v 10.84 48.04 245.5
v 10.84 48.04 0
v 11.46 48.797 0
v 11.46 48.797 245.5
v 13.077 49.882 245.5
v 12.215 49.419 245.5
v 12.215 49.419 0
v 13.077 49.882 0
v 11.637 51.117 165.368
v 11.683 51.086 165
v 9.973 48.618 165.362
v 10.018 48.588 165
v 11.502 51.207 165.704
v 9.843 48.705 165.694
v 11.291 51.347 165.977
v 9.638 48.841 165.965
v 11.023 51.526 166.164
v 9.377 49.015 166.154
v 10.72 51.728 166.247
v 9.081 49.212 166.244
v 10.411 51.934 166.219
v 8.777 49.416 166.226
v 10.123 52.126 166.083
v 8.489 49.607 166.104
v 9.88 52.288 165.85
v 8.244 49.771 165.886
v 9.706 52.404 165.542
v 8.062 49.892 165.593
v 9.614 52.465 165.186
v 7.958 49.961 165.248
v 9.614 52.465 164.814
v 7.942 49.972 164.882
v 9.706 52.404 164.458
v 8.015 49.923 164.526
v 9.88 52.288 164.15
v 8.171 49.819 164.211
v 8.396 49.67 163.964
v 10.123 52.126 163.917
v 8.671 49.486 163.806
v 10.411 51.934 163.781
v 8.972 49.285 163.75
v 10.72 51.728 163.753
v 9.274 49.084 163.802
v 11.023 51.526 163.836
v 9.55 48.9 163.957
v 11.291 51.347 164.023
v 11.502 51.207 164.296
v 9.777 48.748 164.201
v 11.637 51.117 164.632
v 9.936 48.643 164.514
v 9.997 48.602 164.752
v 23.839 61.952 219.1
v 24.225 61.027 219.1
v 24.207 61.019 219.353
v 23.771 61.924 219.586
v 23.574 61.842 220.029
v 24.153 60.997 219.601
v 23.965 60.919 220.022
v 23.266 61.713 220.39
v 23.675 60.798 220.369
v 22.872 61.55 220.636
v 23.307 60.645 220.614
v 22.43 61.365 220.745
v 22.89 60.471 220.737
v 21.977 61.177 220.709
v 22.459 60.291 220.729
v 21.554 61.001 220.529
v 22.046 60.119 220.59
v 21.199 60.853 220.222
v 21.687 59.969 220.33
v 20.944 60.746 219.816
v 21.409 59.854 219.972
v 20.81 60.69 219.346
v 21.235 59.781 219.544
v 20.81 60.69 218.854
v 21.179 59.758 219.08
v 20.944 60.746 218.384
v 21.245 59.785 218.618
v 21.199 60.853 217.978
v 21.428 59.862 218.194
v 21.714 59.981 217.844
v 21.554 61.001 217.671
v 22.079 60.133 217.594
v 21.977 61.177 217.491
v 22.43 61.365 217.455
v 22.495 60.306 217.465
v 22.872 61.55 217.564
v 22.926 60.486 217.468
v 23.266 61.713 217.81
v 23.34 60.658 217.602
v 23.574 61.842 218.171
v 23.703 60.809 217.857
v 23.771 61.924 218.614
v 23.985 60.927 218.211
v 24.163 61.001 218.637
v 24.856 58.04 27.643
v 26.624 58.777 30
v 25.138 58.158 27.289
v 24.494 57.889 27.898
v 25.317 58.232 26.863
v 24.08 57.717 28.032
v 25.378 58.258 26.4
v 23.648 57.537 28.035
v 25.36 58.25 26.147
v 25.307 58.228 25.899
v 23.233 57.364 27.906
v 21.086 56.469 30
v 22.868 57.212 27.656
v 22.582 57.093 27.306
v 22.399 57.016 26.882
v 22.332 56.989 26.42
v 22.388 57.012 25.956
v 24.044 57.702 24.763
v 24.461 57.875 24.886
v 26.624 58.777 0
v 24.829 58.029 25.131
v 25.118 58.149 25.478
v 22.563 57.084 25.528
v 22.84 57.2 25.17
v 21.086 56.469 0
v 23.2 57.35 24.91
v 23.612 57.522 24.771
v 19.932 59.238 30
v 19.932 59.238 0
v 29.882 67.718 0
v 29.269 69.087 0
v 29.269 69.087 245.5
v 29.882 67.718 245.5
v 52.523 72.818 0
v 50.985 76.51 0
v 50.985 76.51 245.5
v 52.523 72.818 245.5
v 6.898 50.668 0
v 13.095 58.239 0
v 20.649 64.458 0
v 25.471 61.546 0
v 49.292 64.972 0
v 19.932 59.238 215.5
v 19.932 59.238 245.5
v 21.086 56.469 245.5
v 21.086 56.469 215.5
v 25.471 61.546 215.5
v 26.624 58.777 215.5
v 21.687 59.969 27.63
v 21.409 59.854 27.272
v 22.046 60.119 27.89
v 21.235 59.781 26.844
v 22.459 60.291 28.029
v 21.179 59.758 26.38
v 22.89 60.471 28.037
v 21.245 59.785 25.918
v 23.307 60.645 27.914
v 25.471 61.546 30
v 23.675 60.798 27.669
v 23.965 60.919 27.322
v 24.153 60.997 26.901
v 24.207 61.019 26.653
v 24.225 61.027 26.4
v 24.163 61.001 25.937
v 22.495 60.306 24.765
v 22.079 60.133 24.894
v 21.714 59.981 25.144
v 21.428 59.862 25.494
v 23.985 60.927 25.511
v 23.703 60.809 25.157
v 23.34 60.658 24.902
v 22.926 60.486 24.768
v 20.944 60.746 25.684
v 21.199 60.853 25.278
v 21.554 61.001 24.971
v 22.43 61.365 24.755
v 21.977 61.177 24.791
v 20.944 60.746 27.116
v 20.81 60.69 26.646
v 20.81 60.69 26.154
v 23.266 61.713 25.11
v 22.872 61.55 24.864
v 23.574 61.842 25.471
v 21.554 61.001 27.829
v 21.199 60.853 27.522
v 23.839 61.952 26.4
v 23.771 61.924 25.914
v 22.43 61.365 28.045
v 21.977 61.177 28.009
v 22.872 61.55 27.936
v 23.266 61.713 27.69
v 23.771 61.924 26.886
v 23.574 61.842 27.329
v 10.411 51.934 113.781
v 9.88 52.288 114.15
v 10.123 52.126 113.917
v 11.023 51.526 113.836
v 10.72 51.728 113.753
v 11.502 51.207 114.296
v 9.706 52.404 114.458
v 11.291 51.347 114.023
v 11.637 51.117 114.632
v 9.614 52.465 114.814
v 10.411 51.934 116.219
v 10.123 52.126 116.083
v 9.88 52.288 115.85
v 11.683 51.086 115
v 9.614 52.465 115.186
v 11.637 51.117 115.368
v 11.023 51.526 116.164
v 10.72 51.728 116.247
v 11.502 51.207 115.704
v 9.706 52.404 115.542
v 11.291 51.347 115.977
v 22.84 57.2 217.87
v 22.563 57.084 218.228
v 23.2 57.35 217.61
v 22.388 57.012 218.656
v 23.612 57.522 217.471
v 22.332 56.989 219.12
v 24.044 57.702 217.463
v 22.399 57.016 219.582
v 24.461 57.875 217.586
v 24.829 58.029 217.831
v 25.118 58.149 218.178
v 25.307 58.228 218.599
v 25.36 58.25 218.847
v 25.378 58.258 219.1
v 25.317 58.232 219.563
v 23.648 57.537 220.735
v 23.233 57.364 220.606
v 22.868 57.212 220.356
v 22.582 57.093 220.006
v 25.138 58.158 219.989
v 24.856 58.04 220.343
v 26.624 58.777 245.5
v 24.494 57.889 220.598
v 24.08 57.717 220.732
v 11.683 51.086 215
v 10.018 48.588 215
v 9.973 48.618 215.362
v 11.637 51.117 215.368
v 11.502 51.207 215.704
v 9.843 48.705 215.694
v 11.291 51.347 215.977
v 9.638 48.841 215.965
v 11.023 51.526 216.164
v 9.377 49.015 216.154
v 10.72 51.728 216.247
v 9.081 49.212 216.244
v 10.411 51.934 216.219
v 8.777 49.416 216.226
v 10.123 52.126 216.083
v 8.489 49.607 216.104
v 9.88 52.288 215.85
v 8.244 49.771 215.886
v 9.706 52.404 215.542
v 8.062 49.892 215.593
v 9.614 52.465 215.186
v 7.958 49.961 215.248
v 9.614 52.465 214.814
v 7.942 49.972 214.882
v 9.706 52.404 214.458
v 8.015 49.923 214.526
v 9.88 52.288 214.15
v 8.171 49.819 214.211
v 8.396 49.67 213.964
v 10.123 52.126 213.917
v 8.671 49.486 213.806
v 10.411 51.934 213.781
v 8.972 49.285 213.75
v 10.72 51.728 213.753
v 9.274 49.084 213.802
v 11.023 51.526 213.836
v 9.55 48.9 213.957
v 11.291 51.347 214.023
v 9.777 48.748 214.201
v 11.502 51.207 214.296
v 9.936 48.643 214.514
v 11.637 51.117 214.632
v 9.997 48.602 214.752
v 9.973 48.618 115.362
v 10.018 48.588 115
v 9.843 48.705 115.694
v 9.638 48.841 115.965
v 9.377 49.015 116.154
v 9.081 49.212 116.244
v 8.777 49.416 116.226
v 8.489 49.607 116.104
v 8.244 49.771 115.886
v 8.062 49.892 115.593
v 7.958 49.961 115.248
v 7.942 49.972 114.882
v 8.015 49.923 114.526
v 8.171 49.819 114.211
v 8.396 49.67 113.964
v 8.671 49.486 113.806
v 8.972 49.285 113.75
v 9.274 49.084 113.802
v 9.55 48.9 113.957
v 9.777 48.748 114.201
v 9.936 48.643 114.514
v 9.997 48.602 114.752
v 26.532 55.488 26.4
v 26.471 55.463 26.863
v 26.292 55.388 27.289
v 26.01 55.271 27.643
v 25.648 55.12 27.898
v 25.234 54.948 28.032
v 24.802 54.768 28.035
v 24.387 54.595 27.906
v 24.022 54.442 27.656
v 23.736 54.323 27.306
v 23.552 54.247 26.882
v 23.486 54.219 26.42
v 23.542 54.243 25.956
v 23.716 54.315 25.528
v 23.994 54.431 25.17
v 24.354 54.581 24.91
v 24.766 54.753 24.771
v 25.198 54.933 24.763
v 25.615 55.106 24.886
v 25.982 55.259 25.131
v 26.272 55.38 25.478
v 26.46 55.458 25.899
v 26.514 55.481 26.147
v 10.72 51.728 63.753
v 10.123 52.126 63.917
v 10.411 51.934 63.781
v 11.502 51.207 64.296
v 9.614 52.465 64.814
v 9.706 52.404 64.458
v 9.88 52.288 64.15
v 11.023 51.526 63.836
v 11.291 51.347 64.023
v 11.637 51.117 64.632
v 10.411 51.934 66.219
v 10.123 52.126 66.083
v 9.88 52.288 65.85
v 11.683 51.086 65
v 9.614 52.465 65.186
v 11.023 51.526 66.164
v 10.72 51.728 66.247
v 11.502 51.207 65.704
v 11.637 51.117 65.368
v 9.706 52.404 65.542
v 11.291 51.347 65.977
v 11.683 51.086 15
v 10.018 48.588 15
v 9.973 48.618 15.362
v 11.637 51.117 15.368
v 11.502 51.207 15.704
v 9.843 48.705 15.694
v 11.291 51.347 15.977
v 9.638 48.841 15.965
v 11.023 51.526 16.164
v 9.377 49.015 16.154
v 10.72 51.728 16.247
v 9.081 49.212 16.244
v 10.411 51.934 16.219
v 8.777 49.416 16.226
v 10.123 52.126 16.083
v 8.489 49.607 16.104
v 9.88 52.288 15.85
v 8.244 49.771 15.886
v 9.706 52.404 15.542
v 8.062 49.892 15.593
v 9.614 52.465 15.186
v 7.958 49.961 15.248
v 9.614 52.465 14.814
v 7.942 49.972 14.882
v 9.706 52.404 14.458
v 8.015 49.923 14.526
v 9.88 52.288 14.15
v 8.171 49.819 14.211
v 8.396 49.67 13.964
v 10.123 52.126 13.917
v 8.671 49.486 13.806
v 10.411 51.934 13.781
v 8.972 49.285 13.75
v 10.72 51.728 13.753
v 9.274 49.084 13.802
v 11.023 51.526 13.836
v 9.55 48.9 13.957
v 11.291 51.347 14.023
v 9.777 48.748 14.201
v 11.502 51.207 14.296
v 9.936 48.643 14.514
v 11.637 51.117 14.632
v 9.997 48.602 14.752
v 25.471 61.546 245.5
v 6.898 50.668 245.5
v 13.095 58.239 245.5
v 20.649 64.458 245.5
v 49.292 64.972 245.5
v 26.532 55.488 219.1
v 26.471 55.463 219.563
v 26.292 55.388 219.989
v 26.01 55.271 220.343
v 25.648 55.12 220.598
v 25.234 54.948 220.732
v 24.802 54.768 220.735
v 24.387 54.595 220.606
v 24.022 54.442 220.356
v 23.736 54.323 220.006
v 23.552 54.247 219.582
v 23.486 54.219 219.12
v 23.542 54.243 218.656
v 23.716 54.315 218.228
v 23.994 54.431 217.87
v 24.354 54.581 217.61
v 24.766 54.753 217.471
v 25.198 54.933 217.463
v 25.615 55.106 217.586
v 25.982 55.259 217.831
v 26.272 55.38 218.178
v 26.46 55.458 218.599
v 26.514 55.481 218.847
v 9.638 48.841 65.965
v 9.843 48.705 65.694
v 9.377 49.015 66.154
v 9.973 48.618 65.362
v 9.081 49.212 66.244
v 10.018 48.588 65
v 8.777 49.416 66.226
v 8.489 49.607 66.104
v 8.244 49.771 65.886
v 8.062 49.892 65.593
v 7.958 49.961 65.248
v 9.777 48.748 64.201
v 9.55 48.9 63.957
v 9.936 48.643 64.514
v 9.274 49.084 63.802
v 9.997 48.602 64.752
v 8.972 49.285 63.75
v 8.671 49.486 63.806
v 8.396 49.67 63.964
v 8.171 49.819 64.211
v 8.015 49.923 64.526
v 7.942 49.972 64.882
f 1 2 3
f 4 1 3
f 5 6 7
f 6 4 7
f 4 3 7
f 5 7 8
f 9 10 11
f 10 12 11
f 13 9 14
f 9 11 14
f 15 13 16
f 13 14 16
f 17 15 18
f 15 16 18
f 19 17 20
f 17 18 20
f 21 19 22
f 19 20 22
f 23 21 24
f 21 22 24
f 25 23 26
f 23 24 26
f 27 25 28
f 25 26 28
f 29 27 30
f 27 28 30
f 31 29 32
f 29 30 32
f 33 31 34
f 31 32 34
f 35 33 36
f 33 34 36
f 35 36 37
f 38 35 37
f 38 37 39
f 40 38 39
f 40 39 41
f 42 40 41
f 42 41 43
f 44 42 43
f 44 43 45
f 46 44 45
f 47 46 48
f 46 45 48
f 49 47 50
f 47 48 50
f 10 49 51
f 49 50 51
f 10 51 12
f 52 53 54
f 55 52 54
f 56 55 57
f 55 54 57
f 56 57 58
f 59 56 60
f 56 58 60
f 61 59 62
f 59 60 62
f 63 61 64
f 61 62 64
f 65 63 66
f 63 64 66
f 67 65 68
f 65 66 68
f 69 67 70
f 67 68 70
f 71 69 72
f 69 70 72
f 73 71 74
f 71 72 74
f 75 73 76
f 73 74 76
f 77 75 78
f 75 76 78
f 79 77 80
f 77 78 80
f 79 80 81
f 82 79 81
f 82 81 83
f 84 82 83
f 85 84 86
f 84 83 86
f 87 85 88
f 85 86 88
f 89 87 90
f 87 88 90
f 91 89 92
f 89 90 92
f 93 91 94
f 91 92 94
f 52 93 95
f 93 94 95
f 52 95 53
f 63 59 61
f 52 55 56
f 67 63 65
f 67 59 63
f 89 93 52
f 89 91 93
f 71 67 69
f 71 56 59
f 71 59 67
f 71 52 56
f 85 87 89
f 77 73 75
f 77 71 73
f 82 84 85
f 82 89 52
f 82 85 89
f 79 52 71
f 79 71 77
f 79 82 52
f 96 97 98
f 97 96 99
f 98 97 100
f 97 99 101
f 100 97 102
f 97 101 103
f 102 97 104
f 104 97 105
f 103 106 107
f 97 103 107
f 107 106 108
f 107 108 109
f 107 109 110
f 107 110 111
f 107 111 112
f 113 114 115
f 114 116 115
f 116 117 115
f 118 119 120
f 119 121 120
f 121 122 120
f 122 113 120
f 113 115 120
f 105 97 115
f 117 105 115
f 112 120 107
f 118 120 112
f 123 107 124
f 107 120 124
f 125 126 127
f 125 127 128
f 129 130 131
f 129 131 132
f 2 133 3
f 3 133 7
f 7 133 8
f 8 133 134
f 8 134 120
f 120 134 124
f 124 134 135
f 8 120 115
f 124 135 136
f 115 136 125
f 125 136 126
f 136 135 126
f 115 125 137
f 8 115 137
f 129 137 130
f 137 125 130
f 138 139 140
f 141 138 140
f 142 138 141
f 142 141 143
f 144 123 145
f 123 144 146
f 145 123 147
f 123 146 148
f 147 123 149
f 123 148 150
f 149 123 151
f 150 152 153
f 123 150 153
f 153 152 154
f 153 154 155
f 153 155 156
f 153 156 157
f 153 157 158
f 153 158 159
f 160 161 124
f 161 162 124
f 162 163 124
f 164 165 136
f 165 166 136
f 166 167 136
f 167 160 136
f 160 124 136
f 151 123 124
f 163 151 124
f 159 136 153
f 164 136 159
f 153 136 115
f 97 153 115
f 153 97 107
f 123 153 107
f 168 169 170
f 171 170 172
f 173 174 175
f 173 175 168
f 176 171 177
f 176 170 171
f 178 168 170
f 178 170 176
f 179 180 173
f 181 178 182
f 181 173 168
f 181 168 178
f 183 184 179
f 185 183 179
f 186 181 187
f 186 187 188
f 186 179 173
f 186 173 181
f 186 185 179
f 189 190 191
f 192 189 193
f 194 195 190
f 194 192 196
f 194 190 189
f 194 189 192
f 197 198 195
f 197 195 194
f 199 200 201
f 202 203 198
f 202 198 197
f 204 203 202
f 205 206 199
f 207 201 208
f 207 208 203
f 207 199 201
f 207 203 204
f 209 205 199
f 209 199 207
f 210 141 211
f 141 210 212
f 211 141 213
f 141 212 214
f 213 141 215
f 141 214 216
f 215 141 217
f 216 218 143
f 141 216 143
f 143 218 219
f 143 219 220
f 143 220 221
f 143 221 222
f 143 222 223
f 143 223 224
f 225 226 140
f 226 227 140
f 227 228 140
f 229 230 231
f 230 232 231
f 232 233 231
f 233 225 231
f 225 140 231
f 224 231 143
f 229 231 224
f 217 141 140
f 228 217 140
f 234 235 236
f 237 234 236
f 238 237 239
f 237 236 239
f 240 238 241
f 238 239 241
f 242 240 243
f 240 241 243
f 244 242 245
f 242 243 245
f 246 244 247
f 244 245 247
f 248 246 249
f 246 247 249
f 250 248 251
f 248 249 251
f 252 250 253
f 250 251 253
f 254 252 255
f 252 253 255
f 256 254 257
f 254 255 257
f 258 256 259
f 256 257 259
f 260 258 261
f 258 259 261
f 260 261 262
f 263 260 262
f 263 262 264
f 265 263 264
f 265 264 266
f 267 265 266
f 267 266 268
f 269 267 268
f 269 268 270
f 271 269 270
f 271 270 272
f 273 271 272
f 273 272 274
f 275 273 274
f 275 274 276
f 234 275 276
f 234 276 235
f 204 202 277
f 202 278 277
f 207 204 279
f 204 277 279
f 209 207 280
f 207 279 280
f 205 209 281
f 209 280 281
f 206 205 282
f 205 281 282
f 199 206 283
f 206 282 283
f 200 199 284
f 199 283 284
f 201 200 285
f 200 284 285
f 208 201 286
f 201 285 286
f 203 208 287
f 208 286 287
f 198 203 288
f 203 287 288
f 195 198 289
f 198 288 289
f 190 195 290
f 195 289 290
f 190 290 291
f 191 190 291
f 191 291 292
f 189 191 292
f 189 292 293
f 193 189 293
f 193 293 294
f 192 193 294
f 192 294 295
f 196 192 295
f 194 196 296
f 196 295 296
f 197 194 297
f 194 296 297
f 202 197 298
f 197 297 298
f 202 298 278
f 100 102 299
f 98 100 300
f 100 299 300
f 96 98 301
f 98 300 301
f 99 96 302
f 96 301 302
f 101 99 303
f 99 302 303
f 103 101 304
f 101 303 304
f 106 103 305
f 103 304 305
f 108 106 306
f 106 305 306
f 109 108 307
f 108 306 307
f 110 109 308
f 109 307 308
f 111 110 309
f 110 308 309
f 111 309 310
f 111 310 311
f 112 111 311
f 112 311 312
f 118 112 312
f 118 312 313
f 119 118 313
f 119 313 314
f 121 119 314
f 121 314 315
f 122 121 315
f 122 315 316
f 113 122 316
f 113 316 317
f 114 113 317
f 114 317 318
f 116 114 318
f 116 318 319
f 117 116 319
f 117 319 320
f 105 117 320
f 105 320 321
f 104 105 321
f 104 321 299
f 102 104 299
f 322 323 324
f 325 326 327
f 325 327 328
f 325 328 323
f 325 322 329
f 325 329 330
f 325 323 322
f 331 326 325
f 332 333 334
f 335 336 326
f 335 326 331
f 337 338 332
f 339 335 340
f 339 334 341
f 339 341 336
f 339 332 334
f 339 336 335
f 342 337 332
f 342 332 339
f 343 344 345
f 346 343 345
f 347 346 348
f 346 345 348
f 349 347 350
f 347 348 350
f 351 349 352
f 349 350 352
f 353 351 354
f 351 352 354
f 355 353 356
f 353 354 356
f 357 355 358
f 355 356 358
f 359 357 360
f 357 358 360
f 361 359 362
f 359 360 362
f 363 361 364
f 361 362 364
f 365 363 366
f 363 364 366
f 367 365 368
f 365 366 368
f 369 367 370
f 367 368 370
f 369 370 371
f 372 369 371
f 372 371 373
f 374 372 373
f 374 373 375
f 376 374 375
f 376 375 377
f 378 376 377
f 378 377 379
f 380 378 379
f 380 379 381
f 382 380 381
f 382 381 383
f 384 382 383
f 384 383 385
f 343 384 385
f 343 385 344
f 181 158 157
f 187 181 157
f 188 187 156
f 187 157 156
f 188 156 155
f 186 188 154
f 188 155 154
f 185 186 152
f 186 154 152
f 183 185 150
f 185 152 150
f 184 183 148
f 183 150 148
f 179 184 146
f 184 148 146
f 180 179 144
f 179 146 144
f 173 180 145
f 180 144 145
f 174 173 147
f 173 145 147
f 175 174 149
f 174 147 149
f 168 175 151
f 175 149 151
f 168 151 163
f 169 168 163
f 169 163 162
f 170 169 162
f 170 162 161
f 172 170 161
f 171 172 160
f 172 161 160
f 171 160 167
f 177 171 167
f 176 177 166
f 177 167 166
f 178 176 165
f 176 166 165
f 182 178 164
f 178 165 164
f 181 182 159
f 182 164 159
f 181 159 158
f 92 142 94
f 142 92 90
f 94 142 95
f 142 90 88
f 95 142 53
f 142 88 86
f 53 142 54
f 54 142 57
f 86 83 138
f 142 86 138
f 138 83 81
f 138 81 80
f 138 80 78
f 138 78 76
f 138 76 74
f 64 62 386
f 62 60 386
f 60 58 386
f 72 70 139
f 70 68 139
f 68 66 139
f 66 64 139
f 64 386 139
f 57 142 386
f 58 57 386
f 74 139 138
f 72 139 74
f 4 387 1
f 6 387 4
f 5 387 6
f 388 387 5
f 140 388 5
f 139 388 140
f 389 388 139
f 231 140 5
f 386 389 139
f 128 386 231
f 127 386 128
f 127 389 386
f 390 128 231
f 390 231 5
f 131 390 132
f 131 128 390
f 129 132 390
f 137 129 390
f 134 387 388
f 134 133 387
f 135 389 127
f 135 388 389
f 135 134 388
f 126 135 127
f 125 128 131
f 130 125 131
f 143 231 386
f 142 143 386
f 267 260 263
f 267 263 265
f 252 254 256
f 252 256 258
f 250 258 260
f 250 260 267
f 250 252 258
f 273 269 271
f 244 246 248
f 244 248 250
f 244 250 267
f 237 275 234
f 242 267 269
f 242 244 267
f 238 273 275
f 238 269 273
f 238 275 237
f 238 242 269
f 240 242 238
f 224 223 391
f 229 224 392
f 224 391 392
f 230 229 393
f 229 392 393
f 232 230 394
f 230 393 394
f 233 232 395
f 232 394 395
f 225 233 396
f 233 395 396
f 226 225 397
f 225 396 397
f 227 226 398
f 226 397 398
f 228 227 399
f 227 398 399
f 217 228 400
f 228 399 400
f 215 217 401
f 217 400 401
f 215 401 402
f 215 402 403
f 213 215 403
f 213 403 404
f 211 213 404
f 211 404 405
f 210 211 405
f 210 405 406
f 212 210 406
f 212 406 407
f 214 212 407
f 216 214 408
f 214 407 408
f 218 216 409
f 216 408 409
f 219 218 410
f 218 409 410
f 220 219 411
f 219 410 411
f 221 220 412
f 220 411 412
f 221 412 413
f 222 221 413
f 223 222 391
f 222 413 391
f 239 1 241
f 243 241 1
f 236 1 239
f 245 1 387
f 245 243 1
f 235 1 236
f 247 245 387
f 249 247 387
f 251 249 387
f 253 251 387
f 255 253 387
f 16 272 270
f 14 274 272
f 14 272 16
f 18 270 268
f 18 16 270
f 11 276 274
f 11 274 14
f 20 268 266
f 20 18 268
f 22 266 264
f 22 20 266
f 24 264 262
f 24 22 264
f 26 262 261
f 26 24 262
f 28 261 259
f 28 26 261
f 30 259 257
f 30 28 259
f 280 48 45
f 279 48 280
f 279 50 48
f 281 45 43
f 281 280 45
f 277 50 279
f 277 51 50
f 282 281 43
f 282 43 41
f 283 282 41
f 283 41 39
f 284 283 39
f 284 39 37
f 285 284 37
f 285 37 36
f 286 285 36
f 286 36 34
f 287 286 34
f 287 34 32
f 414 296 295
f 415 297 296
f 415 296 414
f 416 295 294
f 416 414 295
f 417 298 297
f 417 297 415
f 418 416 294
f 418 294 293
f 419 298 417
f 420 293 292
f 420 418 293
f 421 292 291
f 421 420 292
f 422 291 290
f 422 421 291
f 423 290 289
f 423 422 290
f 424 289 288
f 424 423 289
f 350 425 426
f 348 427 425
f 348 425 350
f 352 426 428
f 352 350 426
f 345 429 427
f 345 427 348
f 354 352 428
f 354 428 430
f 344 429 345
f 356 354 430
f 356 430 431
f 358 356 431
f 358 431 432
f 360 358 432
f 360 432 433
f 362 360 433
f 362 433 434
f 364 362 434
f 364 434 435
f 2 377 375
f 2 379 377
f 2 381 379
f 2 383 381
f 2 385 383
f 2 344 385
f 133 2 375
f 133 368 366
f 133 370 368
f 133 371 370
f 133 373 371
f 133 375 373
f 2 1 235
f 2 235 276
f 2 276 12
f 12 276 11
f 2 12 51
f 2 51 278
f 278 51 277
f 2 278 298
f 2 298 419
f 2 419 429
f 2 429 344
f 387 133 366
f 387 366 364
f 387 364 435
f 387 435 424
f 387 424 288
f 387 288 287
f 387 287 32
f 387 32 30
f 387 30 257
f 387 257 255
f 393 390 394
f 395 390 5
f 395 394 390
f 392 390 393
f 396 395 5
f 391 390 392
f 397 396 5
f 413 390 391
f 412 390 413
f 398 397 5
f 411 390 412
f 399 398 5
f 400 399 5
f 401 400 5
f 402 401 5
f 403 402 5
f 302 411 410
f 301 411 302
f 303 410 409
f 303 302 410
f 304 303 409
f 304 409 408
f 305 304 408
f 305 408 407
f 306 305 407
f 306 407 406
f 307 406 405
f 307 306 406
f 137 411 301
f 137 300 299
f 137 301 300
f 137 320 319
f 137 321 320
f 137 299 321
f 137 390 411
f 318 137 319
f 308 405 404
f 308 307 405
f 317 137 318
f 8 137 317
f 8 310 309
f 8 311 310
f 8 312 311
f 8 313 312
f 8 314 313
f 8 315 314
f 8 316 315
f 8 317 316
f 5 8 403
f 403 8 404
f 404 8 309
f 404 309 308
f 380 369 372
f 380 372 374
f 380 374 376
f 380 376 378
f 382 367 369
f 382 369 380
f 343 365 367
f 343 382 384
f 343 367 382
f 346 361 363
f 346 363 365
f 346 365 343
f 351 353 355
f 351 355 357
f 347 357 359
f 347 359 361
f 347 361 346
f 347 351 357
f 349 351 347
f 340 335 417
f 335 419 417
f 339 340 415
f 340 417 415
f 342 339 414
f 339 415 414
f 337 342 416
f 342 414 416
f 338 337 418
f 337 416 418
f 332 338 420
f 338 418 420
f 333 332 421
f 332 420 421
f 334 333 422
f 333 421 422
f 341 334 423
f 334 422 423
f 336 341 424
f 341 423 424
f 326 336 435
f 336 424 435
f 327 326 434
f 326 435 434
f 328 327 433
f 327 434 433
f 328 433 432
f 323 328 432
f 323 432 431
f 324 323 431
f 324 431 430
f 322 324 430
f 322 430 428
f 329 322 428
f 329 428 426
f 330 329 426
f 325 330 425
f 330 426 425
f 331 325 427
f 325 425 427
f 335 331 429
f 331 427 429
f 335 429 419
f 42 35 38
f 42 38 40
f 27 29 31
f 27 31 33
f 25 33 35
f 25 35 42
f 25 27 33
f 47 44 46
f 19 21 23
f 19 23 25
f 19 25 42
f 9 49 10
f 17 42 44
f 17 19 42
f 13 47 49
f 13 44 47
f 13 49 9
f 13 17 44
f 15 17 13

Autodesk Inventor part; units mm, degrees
ref_plane "YZ Plane" through (0, 0, 0) normal (1, 0, 0) x (0, 1, 0)
ref_plane "XZ Plane" through (0, 0, 0) normal (0, 1, 0) x (-1, 0, 0)
sketch "Sketch1" plane through (0, 0, 0) normal (0, 0, 1) x (1, 0, 0)
  line L0 (10, 0) -> (-1.5, 0) projected
  line L1 (10, 45.2667) -> (10, 0) projected
  arc A0 (13.0769, 49.8821) -> (10, 45.2667) centre (15, 45.2667) ccw projected
  line L2 (54.8615, 67.2923) -> (13.0769, 49.8821) projected
  line L3 (50.4385, 77.9077) -> (54.8615, 67.2923) projected
  line L4 (50.4385, 77.9077) -> (29.2692, 69.0872) projected
  arc A1 (29.2692, 69.0872) -> (-1.5, 22.9333) centre (48.5, 22.9333) ccw projected
  line L5 (-1.5, 0) -> (-1.5, 22.9333) projected
  line L6 (29.2692, 69.0872) -> (33.9692, 58.5872)
  line L7 (15, 45.2667) -> (6.8975, 50.6683)
  line L8 (29.2692, 69.0872) -> (50.4077, 77.8949)
  line L9 (50.4077, 77.8949) -> (52.5231, 72.8179)
  line L10 (52.5231, 72.8179) -> (49.2923, 64.9718)
  line L11 (29.8823, 67.7176) -> (50.9846, 76.5103)
  point P0 (0, 0)
  point P1 (10.8397, 48.0402)
  dimension "d2" = 22.9
  dimension "d3" = 5.5
  dimension "d4" = 45
  dimension "d5" = 1.5
extrude "Extrusion1" add sketch "Sketch1" along normal blind 245.5 contours L7 A1 L6 L2 A0 | L6 L11 L9 L10 L2
sketch "Sketch2" plane through (10.8397, 48.0402, 0) normal (-0.5547, -0.8321, 0) x (0.8321, -0.5547, 0)
  line L0 (-4.738, 0) -> (0, 0) projected
  line L1 (0, 0) -> (0, 245.5) projected
  line L2 (-4.738, 245.5) -> (0, 245.5) projected
  line L3 (-4.738, 0) -> (-4.738, 245.5) projected
  circle A0 centre (-2.238, 15) radius 1.25
  circle A1 centre (-2.238, 65) radius 1.25
  circle A2 centre (-2.238, 115) radius 1.25
  circle A3 centre (-2.238, 165) radius 1.25
  circle A4 centre (-2.238, 215) radius 1.25
  point P0 (17.6287, 0)
  dimension "d6" = 2.5
  dimension "d7" = 2.5
  dimension "d8" = 15
  dimension "d11" = 50
extrude "Extrusion2" cut sketch "Sketch2" against normal blind 3 contours A0 | A1 | A2 | A3 | A4
sketch "Sketch3" plane through (0, 0, 0) normal (0, 0, -1) x (-1, 0, 0)
  line L0 (-13.0769, 49.8821) -> (-49.2923, 64.9718) projected
  line L1 (-26.6245, 58.7769) -> (-21.086, 56.4692)
  line L2 (-21.086, 56.4692) -> (-19.9322, 59.2384)
  line L3 (-19.9322, 59.2384) -> (-25.4706, 61.5461)
  line L4 (-25.4706, 61.5461) -> (-26.6245, 58.7769)
  arc A0 (-10.8397, 48.0402) -> (-13.0769, 49.8821) centre (-15, 45.2667) ccw projected
  line L5 (-6.8975, 50.6683) -> (-10.8397, 48.0402) projected
  arc A1 (-6.8975, 50.6683) -> (-29.2692, 69.0872) centre (-48.5, 22.9333) ccw projected
  line L6 (-29.8823, 67.7176) -> (-29.2692, 69.0872) projected
  line L7 (-50.9846, 76.5103) -> (-29.8823, 67.7176) projected
  line L8 (-52.5231, 72.8179) -> (-50.9846, 76.5103) projected
  line L9 (-49.2923, 64.9718) -> (-52.5231, 72.8179) projected
  line L10 (-13.0769, 49.8821) -> (-49.2923, 64.9718) projected
  point P0 (0, 0)
  dimension "d20" = 6
  dimension "d21" = 3
  dimension "d22" = 3
  dimension "d32" = 12.7
extrude "Extrusion3" cut sketch "Sketch3" against normal blind 30 contours L4 L3 L2 L1
sketch "Sketch4" plane through (49.2923, 64.9718, 0) normal (0.3846, -0.9231, 0) x (0.9231, 0.3846, 0)
  line L0 (-29.3068, 0) -> (-23.3068, 0) projected
  line L1 (-29.3068, 0) -> (-29.3068, 30) projected
  line L2 (-29.3068, 30) -> (-23.3068, 30) projected
  line L3 (-23.3068, 0) -> (-23.3068, 30) projected
  circle A0 centre (-26.3068, 26.4) radius 1.65
  line L4 (-26.3068, 29.7486) -> (-23.4068, 28.0743)
  line L5 (-23.4068, 28.0743) -> (-23.4068, 24.7257)
  line L6 (-23.4068, 24.7257) -> (-26.3068, 23.0514)
  line L7 (-26.3068, 23.0514) -> (-29.2068, 24.7257)
  line L8 (-29.2068, 24.7257) -> (-29.2068, 28.0743)
  line L9 (-29.2068, 28.0743) -> (-26.3068, 29.7486)
  point P0 (-70.4897, 0)
  point P1 (-26.3068, 30)
  dimension "d26" = 3.3
  dimension "d27" = 3.6
  dimension "d28" = 5.8
extrude "Extrusion4" cut sketch "Sketch4" against normal blind 7 contours A0
ref_plane "Work Plane1" through (0, 0, 122.75) normal (0, 0, -1) x (-1, 0, 0)
mirror "Mirror1" about plane through (0, 0, 122.75) normal (0, 0, -1) of "Extrusion4", "Extrusion3"
properties part number "ESQUINA_REDONDEADA_R50"
